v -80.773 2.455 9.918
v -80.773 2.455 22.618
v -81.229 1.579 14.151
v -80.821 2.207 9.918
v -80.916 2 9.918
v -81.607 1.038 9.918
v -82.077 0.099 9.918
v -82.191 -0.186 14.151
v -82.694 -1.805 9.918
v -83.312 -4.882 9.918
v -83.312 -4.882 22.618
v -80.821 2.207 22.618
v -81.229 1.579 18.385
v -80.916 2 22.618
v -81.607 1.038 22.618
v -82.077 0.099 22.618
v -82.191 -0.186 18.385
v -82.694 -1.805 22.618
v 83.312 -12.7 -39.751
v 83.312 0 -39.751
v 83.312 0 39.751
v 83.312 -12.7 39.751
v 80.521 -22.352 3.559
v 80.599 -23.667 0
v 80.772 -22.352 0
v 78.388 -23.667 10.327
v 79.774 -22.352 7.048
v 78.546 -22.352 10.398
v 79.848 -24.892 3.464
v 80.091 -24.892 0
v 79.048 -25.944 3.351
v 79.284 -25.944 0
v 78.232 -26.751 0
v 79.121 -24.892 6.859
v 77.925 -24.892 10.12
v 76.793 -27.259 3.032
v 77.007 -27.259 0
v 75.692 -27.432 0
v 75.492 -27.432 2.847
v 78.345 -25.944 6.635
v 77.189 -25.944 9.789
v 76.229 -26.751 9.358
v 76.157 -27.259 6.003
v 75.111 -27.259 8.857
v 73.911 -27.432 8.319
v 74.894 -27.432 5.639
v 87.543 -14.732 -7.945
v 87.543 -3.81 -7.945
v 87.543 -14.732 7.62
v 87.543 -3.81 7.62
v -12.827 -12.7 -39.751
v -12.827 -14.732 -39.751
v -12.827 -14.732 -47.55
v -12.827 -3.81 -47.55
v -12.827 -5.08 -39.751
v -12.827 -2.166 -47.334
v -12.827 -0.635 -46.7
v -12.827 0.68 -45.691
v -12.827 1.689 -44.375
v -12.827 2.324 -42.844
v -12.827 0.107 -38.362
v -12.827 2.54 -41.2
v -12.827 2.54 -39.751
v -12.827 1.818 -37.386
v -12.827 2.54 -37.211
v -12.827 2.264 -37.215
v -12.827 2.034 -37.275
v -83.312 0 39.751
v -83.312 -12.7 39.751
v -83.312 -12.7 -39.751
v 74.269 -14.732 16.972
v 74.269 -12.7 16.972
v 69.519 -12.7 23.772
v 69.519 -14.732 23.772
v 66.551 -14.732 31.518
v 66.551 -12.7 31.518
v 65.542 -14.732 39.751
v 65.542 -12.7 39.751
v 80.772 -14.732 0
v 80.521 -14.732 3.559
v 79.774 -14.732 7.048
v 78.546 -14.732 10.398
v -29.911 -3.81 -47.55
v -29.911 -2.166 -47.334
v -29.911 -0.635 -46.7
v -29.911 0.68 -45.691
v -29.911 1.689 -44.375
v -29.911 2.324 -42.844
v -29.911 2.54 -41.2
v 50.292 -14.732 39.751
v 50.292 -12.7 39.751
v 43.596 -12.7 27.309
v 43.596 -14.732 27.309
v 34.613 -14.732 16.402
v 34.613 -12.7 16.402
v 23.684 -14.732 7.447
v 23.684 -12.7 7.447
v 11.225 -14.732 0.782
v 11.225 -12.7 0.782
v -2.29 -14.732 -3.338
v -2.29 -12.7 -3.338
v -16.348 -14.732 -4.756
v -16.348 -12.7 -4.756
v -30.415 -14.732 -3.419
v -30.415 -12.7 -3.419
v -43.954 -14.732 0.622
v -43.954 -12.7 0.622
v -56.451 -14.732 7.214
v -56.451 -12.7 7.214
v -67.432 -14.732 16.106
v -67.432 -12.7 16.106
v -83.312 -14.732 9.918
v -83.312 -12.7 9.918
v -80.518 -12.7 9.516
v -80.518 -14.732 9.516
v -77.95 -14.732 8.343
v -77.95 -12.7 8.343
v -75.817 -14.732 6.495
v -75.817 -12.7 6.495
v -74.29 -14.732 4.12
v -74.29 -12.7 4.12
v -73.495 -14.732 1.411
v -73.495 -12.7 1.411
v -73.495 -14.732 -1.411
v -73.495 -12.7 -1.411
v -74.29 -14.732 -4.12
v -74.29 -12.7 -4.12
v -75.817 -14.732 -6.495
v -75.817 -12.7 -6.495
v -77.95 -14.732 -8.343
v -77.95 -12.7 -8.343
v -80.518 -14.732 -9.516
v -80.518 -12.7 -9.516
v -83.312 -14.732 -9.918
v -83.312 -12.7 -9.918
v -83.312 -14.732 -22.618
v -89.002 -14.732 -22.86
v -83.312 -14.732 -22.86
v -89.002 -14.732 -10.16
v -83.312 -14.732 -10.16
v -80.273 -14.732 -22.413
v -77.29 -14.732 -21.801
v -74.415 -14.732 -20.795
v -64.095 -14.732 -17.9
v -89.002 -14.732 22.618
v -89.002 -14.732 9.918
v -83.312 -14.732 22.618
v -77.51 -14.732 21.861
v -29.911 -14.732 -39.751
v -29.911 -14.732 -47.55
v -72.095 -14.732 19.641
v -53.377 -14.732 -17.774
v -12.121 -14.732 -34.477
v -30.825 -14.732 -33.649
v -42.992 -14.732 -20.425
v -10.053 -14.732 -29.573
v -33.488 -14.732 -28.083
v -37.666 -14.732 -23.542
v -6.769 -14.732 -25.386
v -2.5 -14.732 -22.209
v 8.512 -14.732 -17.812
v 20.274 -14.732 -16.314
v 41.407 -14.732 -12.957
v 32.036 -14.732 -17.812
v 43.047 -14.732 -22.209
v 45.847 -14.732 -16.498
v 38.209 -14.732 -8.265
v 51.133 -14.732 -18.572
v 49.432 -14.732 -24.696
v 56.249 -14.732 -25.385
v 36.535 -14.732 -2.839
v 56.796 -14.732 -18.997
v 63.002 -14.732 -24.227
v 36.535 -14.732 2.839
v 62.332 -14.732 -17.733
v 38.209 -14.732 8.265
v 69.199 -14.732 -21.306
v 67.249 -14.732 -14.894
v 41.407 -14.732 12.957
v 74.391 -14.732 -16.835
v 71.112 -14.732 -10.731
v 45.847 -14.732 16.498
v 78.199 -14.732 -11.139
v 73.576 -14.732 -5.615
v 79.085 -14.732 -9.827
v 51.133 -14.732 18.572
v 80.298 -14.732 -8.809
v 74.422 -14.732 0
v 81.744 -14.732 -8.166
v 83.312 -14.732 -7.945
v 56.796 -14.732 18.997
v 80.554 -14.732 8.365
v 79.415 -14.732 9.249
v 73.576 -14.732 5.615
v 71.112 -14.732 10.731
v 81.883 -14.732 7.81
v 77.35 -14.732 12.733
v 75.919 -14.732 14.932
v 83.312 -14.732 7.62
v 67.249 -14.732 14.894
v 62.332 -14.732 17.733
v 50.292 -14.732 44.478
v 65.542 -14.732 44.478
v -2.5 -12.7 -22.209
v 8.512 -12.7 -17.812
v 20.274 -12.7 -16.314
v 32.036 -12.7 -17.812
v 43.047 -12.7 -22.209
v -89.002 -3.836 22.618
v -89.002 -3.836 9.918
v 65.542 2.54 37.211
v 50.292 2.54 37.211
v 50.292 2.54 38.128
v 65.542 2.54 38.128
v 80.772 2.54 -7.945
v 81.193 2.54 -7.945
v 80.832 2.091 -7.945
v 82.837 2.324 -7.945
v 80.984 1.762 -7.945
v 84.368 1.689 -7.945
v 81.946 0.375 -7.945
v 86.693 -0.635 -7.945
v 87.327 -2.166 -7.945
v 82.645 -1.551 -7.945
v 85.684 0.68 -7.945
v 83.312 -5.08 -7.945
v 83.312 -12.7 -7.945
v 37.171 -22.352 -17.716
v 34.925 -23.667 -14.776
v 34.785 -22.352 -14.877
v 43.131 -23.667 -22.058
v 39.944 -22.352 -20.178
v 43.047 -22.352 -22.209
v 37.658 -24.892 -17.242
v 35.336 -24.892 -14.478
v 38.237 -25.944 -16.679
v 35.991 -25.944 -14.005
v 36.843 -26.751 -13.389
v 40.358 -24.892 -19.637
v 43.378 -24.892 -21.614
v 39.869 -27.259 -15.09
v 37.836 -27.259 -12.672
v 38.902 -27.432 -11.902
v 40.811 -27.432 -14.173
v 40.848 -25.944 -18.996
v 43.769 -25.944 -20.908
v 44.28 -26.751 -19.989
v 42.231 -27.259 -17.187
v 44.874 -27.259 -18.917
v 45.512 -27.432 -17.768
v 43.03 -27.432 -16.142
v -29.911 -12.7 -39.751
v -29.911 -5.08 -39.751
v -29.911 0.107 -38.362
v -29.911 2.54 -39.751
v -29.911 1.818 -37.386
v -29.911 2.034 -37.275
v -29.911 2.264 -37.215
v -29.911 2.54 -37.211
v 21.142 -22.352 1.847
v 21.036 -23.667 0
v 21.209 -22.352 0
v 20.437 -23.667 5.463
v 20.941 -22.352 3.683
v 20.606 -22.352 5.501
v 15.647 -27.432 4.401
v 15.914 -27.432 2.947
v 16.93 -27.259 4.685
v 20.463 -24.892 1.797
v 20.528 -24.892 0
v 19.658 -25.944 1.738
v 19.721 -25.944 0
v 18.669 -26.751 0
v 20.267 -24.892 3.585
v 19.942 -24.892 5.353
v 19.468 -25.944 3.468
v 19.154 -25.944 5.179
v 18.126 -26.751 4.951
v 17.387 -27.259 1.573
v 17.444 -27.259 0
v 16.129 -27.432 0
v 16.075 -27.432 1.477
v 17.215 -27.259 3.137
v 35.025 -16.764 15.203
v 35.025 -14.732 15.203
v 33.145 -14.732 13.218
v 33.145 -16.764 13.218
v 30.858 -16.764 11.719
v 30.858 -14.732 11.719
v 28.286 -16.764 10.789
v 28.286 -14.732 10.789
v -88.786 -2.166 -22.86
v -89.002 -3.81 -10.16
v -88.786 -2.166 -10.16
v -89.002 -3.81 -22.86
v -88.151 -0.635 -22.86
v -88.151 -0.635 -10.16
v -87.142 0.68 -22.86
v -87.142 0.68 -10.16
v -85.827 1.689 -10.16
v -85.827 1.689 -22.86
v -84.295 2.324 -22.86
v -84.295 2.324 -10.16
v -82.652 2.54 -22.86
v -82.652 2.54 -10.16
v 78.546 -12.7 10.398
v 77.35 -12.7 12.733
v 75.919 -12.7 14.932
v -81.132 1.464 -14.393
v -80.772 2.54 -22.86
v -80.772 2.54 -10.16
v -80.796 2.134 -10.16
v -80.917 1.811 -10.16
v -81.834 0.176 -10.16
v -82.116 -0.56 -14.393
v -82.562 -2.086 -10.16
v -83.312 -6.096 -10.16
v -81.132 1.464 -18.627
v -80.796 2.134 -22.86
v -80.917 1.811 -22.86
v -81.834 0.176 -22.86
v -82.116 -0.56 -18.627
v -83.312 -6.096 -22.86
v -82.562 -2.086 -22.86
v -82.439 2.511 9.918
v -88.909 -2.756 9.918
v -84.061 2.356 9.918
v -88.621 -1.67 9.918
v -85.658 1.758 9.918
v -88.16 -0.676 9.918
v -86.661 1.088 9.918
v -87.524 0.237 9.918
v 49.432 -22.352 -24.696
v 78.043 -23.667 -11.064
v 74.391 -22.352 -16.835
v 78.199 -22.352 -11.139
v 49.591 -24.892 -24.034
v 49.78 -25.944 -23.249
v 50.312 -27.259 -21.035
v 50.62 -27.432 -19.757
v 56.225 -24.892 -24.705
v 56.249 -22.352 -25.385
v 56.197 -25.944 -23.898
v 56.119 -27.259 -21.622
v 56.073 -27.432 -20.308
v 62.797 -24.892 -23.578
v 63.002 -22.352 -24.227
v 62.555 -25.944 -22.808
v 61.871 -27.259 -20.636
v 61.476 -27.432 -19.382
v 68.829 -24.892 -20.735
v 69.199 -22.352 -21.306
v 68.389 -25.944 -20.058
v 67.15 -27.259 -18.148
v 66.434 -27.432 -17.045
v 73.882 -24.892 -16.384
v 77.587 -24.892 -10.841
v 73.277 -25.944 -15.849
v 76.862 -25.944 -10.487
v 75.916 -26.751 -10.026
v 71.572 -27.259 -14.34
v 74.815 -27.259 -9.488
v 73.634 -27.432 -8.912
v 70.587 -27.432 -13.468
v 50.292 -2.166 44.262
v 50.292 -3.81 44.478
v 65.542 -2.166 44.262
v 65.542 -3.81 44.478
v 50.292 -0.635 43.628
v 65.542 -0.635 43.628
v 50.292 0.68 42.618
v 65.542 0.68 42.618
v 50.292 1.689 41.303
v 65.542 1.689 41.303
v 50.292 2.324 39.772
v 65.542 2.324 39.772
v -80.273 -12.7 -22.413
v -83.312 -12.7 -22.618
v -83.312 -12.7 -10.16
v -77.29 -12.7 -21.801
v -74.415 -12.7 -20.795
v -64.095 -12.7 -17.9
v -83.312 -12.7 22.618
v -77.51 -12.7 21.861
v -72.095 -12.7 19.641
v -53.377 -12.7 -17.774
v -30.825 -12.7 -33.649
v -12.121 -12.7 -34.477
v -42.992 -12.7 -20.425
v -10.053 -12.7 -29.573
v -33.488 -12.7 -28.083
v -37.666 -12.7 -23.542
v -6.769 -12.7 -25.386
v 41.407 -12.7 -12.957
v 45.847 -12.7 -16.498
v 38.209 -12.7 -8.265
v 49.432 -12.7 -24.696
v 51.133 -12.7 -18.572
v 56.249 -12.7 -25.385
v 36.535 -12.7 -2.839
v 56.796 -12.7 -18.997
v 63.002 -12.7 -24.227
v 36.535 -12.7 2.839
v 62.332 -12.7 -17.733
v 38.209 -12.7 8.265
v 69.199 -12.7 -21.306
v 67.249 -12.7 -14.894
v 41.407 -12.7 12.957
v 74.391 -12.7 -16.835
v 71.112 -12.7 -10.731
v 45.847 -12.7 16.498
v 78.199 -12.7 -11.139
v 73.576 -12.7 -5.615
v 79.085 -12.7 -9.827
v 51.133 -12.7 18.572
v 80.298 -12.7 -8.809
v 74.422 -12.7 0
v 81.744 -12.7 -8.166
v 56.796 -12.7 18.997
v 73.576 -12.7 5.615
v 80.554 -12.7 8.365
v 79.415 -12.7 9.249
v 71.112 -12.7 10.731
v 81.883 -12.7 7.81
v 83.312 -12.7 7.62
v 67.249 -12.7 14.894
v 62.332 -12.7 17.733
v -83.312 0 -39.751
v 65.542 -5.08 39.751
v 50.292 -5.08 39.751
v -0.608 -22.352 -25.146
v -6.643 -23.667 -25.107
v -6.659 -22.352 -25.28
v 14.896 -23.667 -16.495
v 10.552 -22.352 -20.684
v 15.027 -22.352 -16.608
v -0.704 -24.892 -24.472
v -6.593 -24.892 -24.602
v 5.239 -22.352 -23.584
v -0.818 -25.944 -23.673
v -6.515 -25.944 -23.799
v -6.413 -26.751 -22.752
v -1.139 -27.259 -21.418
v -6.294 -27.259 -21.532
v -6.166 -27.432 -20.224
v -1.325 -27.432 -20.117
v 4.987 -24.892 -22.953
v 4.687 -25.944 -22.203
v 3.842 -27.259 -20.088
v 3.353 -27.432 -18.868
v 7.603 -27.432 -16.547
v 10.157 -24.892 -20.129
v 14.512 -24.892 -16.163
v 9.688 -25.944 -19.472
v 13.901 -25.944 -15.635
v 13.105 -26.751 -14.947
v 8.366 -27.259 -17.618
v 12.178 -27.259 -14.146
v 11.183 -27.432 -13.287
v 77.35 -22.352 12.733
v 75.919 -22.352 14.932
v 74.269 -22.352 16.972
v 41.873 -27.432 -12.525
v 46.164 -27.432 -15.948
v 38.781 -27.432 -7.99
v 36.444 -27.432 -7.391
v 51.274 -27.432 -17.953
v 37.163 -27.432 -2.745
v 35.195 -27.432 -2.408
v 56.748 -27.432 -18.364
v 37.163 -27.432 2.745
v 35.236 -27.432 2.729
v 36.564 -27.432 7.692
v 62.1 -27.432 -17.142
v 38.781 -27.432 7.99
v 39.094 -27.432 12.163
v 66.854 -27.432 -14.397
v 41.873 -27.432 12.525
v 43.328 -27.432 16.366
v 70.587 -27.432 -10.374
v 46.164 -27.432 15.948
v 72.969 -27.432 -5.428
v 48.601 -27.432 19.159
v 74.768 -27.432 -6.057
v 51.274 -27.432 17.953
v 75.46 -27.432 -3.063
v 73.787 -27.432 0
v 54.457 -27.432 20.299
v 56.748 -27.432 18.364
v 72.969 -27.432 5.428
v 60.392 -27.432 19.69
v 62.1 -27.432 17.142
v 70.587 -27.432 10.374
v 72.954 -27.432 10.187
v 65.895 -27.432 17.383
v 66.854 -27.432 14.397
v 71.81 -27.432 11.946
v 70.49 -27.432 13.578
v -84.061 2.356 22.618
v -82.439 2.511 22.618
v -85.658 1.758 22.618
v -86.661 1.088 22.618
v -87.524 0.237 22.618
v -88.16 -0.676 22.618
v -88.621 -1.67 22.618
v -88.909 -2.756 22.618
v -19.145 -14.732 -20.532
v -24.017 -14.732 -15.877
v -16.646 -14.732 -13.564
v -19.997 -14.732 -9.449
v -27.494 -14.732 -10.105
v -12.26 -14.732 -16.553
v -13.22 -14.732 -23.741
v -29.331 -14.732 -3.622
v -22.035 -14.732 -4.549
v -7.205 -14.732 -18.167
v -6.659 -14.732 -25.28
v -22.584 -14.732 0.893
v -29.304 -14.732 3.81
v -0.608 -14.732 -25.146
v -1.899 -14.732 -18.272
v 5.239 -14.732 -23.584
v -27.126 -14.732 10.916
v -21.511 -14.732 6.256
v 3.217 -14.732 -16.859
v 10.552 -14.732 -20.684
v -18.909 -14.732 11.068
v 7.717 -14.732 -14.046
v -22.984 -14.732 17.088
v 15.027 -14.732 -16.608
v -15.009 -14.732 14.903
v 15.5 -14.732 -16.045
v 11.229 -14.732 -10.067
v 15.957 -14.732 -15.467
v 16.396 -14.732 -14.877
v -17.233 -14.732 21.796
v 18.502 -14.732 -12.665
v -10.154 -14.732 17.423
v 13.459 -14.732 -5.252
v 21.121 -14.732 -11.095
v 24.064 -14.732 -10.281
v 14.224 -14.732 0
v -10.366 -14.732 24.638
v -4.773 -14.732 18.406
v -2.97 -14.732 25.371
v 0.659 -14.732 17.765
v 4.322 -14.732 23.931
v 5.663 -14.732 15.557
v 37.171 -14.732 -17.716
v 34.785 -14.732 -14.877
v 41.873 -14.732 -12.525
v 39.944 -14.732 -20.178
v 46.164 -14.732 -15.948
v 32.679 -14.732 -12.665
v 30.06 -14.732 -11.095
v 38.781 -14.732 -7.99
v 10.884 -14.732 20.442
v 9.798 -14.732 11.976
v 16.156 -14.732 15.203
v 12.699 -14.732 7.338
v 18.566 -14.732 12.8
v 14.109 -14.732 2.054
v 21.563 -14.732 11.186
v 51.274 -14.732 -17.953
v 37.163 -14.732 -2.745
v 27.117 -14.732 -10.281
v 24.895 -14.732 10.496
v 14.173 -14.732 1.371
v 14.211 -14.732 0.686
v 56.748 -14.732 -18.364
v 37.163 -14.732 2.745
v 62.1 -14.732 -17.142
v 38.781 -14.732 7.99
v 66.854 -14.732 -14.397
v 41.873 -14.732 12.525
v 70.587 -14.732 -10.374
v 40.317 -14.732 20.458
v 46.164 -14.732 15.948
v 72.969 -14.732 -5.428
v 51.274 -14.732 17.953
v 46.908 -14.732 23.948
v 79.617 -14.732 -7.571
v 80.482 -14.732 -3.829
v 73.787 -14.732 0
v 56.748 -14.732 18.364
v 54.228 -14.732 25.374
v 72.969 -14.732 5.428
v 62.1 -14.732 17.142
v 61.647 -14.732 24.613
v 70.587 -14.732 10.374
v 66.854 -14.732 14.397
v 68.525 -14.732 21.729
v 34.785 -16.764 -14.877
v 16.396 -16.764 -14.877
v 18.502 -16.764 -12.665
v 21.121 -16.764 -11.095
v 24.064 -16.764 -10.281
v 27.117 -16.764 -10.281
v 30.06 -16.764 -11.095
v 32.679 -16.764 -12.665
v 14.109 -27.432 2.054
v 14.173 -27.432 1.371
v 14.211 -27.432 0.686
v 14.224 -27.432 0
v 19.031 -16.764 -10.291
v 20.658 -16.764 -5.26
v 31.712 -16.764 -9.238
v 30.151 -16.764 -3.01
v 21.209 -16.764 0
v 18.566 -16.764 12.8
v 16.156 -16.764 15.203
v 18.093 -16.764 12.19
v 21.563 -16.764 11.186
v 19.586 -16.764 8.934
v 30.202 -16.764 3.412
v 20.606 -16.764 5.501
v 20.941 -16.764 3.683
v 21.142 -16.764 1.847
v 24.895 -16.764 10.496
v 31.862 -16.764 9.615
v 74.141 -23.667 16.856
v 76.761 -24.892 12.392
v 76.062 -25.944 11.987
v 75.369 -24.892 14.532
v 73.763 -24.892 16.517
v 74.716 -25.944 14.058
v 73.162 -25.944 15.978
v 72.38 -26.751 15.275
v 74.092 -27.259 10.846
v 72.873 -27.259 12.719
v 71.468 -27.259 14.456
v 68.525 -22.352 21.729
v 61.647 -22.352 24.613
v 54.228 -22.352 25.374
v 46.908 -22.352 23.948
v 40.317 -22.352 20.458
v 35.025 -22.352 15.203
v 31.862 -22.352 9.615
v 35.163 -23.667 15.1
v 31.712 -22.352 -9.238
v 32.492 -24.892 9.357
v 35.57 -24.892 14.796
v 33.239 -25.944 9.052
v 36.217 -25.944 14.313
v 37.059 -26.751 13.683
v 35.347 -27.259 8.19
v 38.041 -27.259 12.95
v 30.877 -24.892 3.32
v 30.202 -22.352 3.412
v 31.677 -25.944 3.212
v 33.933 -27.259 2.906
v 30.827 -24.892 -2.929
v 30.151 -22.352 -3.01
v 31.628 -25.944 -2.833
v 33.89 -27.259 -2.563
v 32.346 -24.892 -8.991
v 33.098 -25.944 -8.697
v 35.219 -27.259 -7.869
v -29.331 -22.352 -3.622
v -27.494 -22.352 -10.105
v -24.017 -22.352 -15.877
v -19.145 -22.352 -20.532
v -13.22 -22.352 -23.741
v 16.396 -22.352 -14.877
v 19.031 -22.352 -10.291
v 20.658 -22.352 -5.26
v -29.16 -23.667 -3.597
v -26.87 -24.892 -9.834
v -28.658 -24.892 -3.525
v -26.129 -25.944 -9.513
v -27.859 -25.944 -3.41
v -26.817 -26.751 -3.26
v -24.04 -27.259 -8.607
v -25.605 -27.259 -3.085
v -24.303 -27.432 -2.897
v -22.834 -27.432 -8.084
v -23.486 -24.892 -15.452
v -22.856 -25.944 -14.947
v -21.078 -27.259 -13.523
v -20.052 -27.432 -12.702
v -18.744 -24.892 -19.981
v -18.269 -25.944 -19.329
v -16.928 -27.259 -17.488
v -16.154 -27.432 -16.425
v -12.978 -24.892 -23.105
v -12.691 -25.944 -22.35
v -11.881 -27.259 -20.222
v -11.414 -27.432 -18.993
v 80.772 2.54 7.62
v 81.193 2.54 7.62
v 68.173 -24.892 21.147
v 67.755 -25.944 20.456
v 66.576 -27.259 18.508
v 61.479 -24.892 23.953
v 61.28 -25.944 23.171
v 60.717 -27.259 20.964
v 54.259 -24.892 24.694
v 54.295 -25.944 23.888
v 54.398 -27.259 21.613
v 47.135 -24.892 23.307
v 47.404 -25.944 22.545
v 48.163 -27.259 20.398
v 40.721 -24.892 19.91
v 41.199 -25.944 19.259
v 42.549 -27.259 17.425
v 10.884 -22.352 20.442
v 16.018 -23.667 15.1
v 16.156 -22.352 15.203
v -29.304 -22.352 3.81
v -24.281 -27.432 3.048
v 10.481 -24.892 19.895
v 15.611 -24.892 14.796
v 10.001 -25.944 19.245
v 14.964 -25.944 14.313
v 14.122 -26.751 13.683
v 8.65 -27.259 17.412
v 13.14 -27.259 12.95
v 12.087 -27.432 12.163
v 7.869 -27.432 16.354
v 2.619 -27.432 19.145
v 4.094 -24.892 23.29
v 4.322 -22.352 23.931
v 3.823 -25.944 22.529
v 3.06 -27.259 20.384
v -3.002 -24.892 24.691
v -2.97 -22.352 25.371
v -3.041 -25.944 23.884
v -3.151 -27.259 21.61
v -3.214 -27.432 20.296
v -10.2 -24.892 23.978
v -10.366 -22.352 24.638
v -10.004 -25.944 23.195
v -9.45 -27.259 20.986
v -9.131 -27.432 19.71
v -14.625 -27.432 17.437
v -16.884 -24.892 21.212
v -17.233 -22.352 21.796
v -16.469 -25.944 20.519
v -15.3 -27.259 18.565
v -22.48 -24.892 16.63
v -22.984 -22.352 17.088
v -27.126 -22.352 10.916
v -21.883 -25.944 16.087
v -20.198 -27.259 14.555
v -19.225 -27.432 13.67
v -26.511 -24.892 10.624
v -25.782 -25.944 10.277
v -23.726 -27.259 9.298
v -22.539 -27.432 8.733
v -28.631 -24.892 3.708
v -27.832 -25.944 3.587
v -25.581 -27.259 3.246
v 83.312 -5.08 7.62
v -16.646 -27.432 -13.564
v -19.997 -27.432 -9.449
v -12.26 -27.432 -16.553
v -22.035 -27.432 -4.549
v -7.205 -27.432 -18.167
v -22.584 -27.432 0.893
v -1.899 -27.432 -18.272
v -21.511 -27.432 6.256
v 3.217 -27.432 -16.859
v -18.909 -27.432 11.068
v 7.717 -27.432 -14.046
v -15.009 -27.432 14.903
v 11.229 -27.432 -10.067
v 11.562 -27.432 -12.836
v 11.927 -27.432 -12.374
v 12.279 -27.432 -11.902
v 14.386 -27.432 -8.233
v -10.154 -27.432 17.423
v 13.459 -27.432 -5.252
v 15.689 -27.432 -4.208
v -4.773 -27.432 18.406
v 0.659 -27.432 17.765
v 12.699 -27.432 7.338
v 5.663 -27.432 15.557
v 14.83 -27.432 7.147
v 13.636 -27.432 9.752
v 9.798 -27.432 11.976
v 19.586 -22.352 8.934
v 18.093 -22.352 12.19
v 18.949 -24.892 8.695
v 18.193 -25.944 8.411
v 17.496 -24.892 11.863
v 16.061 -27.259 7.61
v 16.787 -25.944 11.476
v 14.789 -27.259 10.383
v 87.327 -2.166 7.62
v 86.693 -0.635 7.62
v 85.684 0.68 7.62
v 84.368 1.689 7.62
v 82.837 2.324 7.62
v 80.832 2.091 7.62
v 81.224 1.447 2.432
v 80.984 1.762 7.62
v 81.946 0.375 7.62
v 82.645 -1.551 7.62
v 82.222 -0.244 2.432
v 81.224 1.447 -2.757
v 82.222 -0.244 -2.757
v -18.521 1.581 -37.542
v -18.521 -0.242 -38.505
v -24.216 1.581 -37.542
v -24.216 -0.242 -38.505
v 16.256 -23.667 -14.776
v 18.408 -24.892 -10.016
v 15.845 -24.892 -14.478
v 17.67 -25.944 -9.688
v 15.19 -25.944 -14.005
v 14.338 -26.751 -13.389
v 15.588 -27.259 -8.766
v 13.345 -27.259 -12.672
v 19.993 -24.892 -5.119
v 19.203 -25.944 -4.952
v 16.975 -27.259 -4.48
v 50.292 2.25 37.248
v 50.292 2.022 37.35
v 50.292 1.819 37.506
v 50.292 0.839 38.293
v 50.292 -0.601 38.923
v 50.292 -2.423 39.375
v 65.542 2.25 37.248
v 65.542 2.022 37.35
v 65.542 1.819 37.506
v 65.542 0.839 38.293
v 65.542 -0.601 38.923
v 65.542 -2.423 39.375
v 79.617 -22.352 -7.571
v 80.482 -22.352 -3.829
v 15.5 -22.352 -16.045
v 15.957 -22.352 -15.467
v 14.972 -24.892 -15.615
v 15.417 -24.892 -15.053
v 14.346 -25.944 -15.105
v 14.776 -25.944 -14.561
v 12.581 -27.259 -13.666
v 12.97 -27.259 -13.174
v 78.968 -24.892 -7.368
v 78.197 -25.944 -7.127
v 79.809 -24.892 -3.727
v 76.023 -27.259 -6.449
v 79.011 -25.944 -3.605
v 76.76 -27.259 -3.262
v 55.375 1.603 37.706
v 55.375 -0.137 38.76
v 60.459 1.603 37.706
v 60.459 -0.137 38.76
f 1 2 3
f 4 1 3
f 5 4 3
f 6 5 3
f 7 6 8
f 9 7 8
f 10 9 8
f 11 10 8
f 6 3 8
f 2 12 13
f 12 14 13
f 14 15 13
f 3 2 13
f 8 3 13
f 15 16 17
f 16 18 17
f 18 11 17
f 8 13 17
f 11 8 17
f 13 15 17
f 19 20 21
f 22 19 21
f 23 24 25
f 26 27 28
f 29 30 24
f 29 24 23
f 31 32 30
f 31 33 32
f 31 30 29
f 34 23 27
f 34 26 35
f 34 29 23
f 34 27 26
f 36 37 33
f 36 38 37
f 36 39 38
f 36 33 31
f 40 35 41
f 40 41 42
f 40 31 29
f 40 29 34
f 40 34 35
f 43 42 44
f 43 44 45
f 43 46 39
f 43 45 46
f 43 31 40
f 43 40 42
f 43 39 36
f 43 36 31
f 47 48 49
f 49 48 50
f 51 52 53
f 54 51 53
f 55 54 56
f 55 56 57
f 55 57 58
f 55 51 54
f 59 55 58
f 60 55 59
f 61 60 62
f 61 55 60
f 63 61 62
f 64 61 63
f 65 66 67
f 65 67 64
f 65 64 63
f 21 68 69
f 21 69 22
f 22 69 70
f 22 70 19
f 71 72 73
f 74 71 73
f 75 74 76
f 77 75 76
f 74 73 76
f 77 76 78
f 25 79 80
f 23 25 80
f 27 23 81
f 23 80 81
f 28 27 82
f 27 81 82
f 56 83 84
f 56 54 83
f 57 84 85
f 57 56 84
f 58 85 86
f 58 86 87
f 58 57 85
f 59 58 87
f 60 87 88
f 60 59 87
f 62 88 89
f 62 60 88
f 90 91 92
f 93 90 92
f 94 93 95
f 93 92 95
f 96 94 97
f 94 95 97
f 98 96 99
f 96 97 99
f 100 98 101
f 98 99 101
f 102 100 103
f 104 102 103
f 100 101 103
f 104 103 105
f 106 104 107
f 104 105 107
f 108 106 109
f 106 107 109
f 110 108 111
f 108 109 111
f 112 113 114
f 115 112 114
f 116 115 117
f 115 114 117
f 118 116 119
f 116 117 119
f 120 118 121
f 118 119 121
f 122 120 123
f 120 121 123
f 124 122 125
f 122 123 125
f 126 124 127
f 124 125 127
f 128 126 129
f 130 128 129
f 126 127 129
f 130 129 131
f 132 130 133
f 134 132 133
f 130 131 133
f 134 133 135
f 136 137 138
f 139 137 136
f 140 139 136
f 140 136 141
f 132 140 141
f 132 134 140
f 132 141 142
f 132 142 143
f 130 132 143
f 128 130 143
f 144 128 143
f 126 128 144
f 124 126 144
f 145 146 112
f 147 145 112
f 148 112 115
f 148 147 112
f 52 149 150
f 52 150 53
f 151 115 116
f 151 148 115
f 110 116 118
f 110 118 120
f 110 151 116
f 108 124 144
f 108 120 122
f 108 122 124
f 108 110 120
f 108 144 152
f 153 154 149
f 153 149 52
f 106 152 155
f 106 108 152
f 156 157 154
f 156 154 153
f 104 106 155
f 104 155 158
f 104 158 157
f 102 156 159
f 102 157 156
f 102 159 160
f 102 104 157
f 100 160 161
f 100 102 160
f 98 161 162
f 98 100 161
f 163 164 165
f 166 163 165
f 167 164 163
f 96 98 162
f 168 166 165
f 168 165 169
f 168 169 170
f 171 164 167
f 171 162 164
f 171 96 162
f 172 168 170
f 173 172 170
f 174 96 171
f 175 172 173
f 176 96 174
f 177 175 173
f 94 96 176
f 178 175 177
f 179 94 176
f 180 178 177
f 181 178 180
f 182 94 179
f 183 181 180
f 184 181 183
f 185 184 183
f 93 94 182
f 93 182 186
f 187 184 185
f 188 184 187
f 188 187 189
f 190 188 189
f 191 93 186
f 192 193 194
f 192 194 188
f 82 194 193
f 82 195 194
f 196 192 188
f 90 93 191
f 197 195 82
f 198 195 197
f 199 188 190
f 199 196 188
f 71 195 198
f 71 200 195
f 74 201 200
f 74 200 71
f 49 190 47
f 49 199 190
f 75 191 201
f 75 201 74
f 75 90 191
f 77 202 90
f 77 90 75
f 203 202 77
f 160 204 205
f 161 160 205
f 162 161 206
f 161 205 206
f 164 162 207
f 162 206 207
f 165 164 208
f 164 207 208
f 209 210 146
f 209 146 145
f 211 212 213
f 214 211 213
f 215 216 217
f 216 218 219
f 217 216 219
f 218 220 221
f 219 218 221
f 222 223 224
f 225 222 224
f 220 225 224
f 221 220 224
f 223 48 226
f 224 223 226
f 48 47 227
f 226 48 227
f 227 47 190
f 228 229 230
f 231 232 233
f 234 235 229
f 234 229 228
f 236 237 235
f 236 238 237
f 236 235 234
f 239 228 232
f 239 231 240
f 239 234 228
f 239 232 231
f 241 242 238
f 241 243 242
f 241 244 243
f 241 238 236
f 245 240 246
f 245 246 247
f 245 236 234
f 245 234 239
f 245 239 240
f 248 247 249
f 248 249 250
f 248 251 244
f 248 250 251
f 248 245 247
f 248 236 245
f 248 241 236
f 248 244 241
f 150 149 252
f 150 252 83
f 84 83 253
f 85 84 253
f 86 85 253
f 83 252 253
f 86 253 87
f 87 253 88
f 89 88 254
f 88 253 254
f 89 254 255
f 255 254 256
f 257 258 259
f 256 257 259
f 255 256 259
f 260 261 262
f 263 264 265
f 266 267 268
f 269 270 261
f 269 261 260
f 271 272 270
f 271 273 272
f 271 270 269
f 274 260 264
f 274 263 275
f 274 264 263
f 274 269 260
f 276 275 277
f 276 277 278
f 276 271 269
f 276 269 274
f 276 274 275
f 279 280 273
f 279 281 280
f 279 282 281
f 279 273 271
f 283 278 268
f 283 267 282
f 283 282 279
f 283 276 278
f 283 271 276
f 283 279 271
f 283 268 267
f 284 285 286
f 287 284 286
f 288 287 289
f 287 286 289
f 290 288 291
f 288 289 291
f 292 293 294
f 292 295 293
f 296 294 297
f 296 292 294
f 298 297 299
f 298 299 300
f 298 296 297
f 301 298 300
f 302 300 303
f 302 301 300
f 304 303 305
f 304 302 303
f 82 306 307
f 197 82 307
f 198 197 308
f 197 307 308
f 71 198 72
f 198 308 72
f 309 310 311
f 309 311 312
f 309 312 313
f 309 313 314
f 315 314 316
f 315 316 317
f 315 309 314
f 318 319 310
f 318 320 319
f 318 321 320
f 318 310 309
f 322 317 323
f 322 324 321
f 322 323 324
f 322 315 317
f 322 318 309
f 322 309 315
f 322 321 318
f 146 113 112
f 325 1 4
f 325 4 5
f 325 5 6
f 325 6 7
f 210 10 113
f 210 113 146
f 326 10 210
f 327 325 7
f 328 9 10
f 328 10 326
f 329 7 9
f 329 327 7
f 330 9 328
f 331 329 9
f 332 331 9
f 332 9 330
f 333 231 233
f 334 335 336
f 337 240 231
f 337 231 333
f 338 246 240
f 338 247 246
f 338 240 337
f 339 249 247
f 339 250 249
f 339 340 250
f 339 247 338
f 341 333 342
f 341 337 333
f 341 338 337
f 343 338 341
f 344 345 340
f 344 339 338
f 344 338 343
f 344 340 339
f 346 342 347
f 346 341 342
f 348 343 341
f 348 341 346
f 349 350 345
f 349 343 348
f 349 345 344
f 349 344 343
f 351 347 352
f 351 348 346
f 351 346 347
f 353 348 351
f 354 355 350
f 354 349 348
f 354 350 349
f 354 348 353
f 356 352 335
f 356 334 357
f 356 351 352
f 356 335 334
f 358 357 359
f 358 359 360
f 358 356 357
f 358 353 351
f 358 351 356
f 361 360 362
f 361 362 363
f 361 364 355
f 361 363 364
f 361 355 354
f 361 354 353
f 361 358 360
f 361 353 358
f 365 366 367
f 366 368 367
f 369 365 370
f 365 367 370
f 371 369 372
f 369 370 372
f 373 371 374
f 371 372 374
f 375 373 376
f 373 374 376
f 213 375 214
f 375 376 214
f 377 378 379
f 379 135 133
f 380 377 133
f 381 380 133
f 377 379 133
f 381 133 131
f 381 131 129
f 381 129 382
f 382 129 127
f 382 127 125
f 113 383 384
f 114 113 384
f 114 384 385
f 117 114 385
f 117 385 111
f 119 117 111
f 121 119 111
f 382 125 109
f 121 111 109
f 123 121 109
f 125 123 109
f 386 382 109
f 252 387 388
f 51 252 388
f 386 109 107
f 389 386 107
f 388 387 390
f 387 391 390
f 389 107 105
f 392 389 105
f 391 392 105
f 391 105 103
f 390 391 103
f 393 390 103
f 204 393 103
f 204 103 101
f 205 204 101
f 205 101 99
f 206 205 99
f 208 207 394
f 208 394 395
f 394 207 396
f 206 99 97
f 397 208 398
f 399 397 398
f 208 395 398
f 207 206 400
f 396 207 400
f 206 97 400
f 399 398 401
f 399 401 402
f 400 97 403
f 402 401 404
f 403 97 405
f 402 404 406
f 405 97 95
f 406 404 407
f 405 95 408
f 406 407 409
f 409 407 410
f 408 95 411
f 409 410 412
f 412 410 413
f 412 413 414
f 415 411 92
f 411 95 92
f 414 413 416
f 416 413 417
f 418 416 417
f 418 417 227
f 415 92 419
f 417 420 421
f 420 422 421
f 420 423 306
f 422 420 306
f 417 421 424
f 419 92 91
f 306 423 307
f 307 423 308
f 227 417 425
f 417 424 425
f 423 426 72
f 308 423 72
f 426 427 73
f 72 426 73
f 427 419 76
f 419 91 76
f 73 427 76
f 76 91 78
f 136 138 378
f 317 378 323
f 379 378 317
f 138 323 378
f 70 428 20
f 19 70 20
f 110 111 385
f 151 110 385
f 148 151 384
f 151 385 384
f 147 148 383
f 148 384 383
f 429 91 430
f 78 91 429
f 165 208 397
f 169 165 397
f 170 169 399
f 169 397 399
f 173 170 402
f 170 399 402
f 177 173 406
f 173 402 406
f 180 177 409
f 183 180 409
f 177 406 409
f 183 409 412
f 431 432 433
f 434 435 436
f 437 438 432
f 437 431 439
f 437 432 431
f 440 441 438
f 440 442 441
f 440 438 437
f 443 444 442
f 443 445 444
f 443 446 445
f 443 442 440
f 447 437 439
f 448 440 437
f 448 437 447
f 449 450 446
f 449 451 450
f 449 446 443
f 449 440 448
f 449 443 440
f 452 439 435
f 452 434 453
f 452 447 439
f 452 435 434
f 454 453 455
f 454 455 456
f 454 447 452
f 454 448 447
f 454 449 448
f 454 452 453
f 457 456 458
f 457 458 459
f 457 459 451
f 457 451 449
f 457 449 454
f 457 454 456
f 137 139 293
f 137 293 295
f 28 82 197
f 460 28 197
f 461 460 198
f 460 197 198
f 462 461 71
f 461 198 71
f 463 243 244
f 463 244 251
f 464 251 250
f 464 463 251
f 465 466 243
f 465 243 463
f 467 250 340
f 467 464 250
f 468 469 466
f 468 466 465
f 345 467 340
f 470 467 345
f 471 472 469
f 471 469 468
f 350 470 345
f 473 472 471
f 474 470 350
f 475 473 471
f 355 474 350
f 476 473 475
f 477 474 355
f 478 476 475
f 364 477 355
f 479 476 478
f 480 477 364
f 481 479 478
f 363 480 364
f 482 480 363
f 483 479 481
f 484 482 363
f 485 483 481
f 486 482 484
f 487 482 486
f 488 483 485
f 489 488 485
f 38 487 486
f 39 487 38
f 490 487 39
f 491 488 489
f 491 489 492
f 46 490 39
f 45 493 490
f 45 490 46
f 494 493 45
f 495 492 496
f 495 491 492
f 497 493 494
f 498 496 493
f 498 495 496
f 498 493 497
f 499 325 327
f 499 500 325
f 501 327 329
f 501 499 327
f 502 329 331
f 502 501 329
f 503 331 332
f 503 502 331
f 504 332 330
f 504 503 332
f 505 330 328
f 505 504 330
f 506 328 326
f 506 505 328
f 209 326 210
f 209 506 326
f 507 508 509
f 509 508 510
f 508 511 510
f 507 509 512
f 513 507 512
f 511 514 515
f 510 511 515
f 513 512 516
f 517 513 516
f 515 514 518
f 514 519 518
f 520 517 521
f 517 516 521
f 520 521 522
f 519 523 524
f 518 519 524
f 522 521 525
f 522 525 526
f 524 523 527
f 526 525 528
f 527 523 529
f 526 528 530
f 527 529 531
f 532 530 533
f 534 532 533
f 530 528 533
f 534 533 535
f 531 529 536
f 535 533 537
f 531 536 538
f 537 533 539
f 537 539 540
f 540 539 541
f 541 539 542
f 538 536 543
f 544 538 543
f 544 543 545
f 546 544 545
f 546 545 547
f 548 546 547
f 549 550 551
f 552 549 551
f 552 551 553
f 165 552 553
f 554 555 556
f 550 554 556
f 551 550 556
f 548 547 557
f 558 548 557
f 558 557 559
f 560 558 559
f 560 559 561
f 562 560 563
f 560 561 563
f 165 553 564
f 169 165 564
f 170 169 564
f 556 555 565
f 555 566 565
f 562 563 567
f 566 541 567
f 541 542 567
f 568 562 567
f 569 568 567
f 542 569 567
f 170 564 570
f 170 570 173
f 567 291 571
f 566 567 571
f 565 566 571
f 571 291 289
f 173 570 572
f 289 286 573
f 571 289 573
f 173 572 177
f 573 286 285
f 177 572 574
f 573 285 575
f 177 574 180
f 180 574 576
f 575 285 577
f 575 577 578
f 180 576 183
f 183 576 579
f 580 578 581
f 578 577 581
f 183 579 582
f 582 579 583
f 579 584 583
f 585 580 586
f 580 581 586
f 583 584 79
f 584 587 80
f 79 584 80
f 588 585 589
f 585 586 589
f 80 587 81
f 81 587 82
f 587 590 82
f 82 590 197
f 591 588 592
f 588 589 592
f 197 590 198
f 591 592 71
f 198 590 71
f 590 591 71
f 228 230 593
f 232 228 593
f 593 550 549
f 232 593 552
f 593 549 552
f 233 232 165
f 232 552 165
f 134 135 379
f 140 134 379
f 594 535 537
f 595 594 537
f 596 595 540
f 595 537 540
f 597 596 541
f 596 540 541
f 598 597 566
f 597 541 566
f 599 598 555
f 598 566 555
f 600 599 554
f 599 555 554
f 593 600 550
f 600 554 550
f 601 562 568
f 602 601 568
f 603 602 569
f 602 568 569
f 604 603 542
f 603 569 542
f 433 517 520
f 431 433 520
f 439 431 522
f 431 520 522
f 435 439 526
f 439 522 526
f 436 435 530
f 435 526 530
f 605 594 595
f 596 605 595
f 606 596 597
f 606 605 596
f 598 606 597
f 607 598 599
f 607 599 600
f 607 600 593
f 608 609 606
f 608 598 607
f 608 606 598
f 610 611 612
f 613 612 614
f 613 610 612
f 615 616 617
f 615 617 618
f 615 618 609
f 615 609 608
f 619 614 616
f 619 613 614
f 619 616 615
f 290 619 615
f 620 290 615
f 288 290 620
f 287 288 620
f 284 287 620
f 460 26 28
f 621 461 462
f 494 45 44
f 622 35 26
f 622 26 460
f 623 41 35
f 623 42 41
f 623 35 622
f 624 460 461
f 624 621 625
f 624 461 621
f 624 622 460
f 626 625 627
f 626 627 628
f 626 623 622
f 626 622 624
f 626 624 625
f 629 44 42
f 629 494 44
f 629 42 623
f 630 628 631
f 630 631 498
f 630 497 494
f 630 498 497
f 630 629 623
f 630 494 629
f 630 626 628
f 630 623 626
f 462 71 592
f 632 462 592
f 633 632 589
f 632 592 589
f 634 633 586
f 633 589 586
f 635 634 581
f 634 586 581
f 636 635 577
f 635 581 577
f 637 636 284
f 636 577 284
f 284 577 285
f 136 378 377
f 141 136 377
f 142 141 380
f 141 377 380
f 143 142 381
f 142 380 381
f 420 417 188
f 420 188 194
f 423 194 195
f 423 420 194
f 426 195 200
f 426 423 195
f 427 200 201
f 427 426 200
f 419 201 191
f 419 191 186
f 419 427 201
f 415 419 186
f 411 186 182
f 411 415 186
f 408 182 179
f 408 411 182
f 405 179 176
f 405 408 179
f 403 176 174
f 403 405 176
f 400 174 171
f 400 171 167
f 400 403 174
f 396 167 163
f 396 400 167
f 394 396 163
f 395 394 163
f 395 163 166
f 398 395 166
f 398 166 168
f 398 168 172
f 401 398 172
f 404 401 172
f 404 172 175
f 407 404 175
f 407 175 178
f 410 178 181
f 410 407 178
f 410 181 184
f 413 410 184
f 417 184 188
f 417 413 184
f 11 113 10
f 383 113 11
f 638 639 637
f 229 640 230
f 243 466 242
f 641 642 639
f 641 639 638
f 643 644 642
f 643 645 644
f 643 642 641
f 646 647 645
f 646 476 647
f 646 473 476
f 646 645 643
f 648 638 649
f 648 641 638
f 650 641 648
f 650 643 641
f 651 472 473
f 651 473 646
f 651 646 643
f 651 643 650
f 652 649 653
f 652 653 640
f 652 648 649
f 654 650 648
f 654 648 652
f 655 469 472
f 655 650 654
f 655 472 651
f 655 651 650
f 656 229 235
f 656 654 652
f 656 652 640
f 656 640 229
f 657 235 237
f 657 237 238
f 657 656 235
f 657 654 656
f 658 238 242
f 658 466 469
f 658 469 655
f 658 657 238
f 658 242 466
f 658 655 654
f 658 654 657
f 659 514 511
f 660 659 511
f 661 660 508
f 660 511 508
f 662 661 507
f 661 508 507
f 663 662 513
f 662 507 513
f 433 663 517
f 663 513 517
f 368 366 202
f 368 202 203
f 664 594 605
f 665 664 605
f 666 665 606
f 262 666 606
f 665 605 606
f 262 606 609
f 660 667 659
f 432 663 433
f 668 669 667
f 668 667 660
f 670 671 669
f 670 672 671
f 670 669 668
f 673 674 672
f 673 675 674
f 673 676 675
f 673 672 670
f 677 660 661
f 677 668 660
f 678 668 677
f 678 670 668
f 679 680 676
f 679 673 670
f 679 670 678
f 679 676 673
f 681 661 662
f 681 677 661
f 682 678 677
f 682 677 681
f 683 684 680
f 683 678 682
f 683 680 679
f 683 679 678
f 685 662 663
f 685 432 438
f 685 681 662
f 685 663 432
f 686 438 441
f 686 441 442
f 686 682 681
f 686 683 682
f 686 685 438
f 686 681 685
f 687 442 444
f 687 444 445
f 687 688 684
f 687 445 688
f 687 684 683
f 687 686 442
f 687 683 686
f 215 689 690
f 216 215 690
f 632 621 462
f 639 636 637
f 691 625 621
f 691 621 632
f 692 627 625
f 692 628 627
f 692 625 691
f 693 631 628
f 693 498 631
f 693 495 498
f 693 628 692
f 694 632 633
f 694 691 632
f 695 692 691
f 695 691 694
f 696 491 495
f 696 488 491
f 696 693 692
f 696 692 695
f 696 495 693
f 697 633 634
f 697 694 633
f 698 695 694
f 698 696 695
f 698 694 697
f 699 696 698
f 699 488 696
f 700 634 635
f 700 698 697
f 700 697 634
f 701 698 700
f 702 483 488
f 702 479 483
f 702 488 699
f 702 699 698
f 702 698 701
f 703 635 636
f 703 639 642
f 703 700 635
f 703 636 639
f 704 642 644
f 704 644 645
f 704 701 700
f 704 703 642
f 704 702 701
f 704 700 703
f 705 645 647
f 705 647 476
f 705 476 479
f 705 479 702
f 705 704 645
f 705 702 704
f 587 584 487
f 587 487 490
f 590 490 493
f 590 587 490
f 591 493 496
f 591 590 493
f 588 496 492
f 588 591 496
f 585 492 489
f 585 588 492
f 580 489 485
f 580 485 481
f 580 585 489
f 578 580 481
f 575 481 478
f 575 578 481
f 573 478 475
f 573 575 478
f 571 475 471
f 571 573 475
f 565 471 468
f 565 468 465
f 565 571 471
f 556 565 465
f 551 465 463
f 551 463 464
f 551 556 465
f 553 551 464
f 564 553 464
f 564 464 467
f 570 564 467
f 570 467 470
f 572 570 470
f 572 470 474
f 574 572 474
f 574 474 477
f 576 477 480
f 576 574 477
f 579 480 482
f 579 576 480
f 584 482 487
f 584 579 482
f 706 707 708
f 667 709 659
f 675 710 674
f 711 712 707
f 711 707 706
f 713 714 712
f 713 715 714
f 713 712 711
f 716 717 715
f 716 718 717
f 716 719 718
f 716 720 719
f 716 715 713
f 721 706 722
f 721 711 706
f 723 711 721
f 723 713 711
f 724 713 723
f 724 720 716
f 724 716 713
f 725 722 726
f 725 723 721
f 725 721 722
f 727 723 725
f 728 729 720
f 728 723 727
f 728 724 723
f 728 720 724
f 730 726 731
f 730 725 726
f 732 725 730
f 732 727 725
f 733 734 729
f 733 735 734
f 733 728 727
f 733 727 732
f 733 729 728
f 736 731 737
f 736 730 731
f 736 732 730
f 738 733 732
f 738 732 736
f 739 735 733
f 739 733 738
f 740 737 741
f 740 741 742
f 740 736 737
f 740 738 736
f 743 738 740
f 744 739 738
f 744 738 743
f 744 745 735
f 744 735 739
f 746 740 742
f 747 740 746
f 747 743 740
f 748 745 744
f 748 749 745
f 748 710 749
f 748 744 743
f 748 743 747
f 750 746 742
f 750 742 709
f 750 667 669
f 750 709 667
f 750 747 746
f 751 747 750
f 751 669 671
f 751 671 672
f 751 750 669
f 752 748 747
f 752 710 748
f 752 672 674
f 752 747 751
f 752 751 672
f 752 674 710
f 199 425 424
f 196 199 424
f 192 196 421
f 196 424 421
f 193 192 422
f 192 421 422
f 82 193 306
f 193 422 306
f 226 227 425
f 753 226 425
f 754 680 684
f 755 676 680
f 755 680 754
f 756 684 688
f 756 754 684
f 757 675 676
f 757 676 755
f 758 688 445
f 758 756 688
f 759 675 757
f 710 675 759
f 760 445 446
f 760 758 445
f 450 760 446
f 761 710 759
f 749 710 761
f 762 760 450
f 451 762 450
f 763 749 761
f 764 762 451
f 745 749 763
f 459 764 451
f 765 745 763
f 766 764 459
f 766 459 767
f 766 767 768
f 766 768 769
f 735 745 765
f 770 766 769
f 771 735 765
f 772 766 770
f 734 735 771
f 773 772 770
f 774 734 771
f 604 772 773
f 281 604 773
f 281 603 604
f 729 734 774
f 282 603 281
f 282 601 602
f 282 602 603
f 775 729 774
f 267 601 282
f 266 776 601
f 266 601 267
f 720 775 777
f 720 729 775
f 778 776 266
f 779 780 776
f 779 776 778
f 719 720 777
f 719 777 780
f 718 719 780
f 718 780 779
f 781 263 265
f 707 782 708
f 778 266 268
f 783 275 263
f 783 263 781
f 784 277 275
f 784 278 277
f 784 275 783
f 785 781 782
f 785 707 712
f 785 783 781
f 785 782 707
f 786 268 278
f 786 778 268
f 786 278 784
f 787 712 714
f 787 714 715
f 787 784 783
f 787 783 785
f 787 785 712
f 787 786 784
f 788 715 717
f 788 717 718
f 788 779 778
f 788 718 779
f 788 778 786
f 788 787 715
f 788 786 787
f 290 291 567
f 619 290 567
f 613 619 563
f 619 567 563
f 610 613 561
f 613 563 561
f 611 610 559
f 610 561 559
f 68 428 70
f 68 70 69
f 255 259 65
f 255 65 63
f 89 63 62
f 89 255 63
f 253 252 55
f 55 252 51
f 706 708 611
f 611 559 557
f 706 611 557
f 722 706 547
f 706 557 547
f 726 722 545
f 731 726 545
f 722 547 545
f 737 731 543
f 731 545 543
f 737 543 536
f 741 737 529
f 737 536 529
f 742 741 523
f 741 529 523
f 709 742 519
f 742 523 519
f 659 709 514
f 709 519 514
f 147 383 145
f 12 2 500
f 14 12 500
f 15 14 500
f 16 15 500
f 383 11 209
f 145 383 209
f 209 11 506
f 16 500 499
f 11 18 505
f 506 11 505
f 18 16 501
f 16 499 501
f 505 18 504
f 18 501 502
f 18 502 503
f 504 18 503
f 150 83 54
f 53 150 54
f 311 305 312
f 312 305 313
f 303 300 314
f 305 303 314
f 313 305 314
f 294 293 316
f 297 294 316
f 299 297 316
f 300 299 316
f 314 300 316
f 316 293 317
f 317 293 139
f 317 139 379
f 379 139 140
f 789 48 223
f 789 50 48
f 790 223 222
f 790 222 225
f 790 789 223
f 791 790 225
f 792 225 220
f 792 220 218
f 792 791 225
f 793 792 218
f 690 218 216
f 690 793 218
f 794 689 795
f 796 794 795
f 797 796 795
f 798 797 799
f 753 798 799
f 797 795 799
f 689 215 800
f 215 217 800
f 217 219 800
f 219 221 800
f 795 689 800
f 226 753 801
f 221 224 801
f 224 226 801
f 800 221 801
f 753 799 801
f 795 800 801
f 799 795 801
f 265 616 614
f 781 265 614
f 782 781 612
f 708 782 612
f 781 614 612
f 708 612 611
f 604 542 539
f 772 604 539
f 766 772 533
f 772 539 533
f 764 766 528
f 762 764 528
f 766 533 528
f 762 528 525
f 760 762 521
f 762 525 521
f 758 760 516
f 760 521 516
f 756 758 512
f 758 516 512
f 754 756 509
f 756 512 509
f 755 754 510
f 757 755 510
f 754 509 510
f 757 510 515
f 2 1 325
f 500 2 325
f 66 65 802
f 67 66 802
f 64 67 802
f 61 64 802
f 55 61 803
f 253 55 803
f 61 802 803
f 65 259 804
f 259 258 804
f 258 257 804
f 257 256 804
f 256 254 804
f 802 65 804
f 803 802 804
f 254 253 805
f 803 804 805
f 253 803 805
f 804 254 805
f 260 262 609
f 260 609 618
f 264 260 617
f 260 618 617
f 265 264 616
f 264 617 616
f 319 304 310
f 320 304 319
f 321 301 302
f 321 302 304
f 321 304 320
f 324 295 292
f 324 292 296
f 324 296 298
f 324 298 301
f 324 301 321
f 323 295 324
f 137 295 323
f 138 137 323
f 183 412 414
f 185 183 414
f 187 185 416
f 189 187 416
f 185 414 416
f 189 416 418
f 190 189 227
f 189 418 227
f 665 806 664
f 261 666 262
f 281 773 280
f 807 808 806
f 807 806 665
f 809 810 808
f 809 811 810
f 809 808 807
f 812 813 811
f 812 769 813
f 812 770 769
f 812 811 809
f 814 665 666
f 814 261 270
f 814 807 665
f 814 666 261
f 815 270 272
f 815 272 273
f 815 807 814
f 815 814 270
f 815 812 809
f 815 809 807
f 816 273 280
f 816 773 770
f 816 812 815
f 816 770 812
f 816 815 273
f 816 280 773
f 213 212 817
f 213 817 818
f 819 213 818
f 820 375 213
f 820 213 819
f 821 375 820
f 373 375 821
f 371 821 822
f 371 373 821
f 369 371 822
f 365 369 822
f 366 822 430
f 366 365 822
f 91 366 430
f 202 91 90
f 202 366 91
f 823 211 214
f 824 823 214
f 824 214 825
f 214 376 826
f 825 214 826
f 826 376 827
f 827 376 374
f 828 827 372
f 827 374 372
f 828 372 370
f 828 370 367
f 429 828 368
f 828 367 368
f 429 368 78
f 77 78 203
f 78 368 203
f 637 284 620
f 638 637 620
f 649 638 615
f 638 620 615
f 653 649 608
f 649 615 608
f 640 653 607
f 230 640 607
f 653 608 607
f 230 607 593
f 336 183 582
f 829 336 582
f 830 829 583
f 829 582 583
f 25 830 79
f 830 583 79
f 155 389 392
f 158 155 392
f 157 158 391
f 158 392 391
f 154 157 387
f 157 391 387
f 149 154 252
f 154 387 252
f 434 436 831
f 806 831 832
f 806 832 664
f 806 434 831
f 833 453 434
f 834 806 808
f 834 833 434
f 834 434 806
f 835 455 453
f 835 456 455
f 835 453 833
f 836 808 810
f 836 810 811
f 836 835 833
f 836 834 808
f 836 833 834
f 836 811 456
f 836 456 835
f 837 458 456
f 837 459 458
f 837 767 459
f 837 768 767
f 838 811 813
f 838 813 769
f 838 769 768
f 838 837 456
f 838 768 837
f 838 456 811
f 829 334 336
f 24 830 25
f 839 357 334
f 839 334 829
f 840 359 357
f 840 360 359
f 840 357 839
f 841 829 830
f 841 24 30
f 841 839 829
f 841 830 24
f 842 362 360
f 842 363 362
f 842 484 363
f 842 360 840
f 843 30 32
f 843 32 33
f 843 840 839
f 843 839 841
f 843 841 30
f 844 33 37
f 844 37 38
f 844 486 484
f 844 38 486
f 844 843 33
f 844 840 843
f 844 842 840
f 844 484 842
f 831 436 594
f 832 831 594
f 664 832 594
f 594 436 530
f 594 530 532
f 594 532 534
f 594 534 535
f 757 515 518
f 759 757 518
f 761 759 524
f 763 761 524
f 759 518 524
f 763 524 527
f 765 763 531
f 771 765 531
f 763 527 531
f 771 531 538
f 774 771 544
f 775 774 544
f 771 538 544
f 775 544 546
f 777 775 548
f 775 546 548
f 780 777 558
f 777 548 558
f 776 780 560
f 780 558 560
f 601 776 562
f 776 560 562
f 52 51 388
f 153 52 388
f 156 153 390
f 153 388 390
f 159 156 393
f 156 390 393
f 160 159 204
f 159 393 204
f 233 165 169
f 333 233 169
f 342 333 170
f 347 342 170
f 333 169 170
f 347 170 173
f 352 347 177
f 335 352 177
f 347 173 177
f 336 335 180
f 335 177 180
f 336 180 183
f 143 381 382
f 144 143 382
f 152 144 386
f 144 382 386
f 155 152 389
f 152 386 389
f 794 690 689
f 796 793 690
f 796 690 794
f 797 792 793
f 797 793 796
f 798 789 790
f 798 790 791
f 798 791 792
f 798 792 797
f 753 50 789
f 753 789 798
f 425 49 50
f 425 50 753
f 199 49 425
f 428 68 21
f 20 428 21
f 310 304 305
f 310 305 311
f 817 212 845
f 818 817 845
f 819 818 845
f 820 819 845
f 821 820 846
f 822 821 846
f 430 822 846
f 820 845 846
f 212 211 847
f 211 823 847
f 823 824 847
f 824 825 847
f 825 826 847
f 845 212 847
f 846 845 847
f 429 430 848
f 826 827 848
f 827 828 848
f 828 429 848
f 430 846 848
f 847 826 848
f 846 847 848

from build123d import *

# Parameters (mm, degrees)
F0_W      = 166.624
F0_H      = 79.502
F1_DEPTH  = 12.7
F3_R      = 19.05
F3_W      = 15.2498179367
F3_H      = 4.727289783
F3_W_2    = 4.2314800982
F3_H_2    = 15.5652722449
F3_W_3    = 17.0839390975
F3_H_3    = 7.7993963947
F3_W_4    = 5.6899759536
F3_H_4    = 12.7
F4_DEPTH  = 2.032
F5_DEPTH  = 15.24
F7_DEPTH  = 15.2498179367
F9_DEPTH  = 15.5652722449
F11_DEPTH = 17.0839390975
F13_DEPTH = 12.7
F15_DEPTH = 12.7
F16_R     = 6.35
F18_DEPTH = 2.032
F17_R     = 19.05
F17_R_2   = 18.415
F19_DEPTH = 12.7
F20_R     = 5.08


# Not quite as in the source:
# - a feature of the source that left no trace in its solid (it failed there, or was rolled back) is left out


with BuildPart() as f1:
    # F0 (on Front) → F1 (new body)
    with BuildSketch(Plane.XZ):
        Rectangle(F0_W, F0_H)
    extrude(amount=F1_DEPTH)


with BuildPart() as f4:
    # F3 (on face) → F4 (new body)
    with BuildSketch(Plane.XZ.offset(12.7)):
        with BuildLine():
            Line((83.312, -7.9452722449), (83.312, 7.62))
            ThreePointArc((83.312, 7.62), (80.5537024075, 8.3652624791), (78.5460535381, 10.3982326679))
            ThreePointArc((78.5460535381, 10.3982326679), (76.662940796, 13.8512035585), (74.2693311981, 16.9720615598))
            ThreePointArc((74.2693311981, 16.9720615598), (67.7983810803, 27.5541815195), (65.5418179367, 39.751))
            Line((65.5418179367, 39.751), (50.292, 39.751))
            ThreePointArc((50.292, 39.751), (-2.2901946449, -3.3376030905), (-67.4321012743, 16.1058253792))
            ThreePointArc((-67.4321012743, 16.1058253792), (-74.7303608062, 20.9266400417), (-83.312, 22.6178866096))
            Line((-83.312, 22.6178866096), (-83.312, 9.9178866096))
            ThreePointArc((-83.312, 9.9178866096), (-73.3941133904, 0), (-83.312, -9.9178866096))
            Line((-83.312, -9.9178866096), (-83.312, -10.16))
            Line((-83.312, -10.16), (-83.312, -22.6178866096))
            ThreePointArc((-83.312, -22.6178866096), (-78.7711442585, -22.1573785413), (-74.4151953336, -20.7946065463))
            ThreePointArc((-74.4151953336, -20.7946065463), (-58.7402465196, -17.4860386913), (-42.9917926654, -20.424889278))
            ThreePointArc((-42.9917926654, -20.424889278), (-33.4884475886, -28.0825335776), (-29.9107422883, -39.751))
            Line((-29.9107422883, -39.751), (-12.8268031908, -39.751))
            ThreePointArc((-12.8268031908, -39.751), (-10.0533012351, -29.573156585), (-2.4996713636, -22.2094967991))
            ThreePointArc((-2.4996713636, -22.2094967991), (20.2738138752, -16.3141101101), (43.0472991139, -22.2094967991))
            ThreePointArc((43.0472991139, -22.2094967991), (63.0016110107, -24.2270310981), (78.1990053344, -11.1394715972))
            ThreePointArc((78.1990053344, -11.1394715972), (80.2976334018, -8.8094548883), (83.312, -7.9452722449))
        make_face()
        with Locations((55.372, 0)):
            Circle(F3_R, mode=Mode.SUBTRACT)
        with Locations((57.9169089684, 42.1146448915)):
            Rectangle(F3_W, F3_H)
        with Locations((85.4277400491, -0.1626361225)):
            Rectangle(F3_W_2, F3_H_2)
        with Locations((-21.3687727395, -43.6506981973)):
            Rectangle(F3_W_3, F3_H_3)
        Polygon((-89.0019759536, -22.86), (-83.312, -22.86), (-83.312, -22.6178866096), (-83.312, -10.16), (-89.0019759536, -10.16), align=None)
        with Locations((-86.1569879768, 16.2678866096)):
            Rectangle(F3_W_4, F3_H_4)
    extrude(amount=F4_DEPTH)

    # F3 (on face) → F5 (join)
    with BuildSketch(Plane.XZ.offset(12.7)):
        Polygon((-89.0019759536, -22.86), (-83.312, -22.86), (-83.312, -22.6178866096), (-83.312, -10.16), (-89.0019759536, -10.16), align=None)
        with Locations((-86.1569879768, 16.2678866096)):
            Rectangle(F3_W_4, F3_H_4)
        with Locations((-21.3687727395, -43.6506981973)):
            Rectangle(F3_W_3, F3_H_3)
        with Locations((57.9169089684, 42.1146448915)):
            Rectangle(F3_W, F3_H)
        with Locations((85.4277400491, -0.1626361225)):
            Rectangle(F3_W_2, F3_H_2)
    extrude(amount=-F5_DEPTH)

    # F6 (on face) → F7 (join, through all)
    with BuildSketch(Plane.YZ.offset(65.5418179367)):
        with BuildLine():
            add(Edge.make_bspline(
                [(2.54, 37.211), (1.2037418783, 37.2195914388), (2.2650531027, 38.99884969), (-5.08, 39.751)],
                knots=[0, 0, 0, 0, 8.0321852568, 8.0321852568, 8.0321852568, 8.0321852568], degree=3))
            Line((2.54, 37.211), (2.54, 39.751))
            Line((2.54, 39.751), (-5.08, 39.751))
        make_face()
    extrude(amount=-F7_DEPTH)

    # F8 (on face) → F9 (join, through all)
    with BuildSketch(Plane(origin=(0, 0, -7.9452722449), x_dir=(1, 0, 0), z_dir=(0, 0, -1))):
        with BuildLine():
            add(Edge.make_bspline(
                [(80.772, -2.54), (80.7990506291, -0.8979742997), (82.3285877705, -2.1777907386), (83.312, 5.08)],
                knots=[0, 0, 0, 0, 8.0321852568, 8.0321852568, 8.0321852568, 8.0321852568], degree=3))
            Line((80.772, -2.54), (83.312, -2.54))
            Line((83.312, -2.54), (83.312, 5.08))
        make_face()
    extrude(amount=-F9_DEPTH)

    # F10 (on face) → F11 (join, through all)
    with BuildSketch(Plane(origin=(-29.9107422883, 0, 0), x_dir=(0, -1, 0), z_dir=(-1, 0, 0))):
        with BuildLine():
            add(Edge.make_bspline(
                [(-2.54, -37.211), (-1.2959121959, -37.1081680059), (-1.9826430362, -38.481), (5.08, -39.751)],
                knots=[0, 0, 0, 0, 8.0321852568, 8.0321852568, 8.0321852568, 8.0321852568], degree=3))
            Line((-2.54, -37.211), (-2.54, -39.751))
            Line((-2.54, -39.751), (5.08, -39.751))
        make_face()
    extrude(amount=-F11_DEPTH)

    # F12 (on face) → F13 (join, through all)
    with BuildSketch(Plane(origin=(0, 0, -22.86), x_dir=(1, 0, 0), z_dir=(0, 0, -1))):
        with BuildLine():
            Line((-83.312, -2.54), (-80.772, -2.54))
            add(Edge.make_bspline(
                [(-80.772, -2.54), (-80.6815177202, -1.0831034742), (-82.1486189961, -2.0507695153), (-83.312, 6.096)],
                knots=[0, 0, 0, 0, 9.0017829345, 9.0017829345, 9.0017829345, 9.0017829345], degree=3))
            Line((-83.312, 6.096), (-83.312, -2.54))
        make_face()
    extrude(amount=-F13_DEPTH)

    # F14 (on face) → F15 (join, through all)
    with BuildSketch(Plane.XY.offset(22.6178866096)):
        with BuildLine():
            add(Edge.make_bspline(
                [(-80.7734341134, 2.4546581032), (-80.8589532971, 1.342135598), (-82.2274386883, 1.9601618405), (-83.312, -4.8822709359)],
                knots=[0, 0, 0, 0, 7.7636875572, 7.7636875572, 7.7636875572, 7.7636875572], degree=3))
            Line((-80.7734341134, 2.4546581032), (-83.312, 2.54))
            Line((-83.312, 2.54), (-83.312, -4.7201365232))
            Line((-83.312, -4.7201365232), (-83.312, -4.8822709359))
        make_face()
    extrude(amount=-F15_DEPTH)

    # F16
    f16_edges = [f4.edges().sort_by_distance(p)[0] for p in [
        (-21.368773, 2.54, -47.550396),
        (-89.001976, 2.54, -16.51),
        (-89.001976, 2.54, 16.267887),
        (87.54348, 2.54, -0.162636),
        (57.916909, 2.54, 44.47829),
    ]]
    fillet(f16_edges, radius=F16_R)


with BuildPart() as f18:
    # F17 (on face) → F18 (new body)
    with BuildSketch(Plane.XZ.offset(14.732)):
        with BuildLine():
            ThreePointArc((28.2864236116, 10.7885061807), (24.5314617002, 8.0209659875), (20.6062090392, 5.5007657527))
            ThreePointArc((20.6062090392, 5.5007657527), (21.0578525442, 2.7668475206), (21.209, 0))
            ThreePointArc((21.209, 0), (19.9758983224, -7.8179936988), (16.3963208288, -14.876902268))
            ThreePointArc((16.3963208288, -14.876902268), (25.5905, -10.1773472949), (34.7846791712, -14.876902268))
            ThreePointArc((34.7846791712, -14.876902268), (29.972808178, 0.2026198097), (35.0246425652, 15.2034550488))
            ThreePointArc((35.0246425652, 15.2034550488), (32.0447675603, 12.4019200322), (28.2864236116, 10.7885061807))
        make_face()
        with BuildLine():
            ThreePointArc((16.1563574348, 15.2034550488), (18.8967351732, 10.5885071929), (20.6062090392, 5.5007657527))
            ThreePointArc((20.6062090392, 5.5007657527), (24.5314617002, 8.0209659875), (28.2864236116, 10.7885061807))
            ThreePointArc((28.2864236116, 10.7885061807), (21.5626169277, 11.1860010324), (16.1563574348, 15.2034550488))
        make_face()
    extrude(amount=F18_DEPTH)

    # F17 (on face) → F19 (join)
    with BuildSketch(Plane.XZ.offset(14.732)):
        with BuildLine():
            ThreePointArc((74.2693311981, 16.9720615598), (54.2284807525, 25.3742460722), (35.0246425652, 15.2034550488))
            ThreePointArc((35.0246425652, 15.2034550488), (29.972808178, 0.2026198097), (34.7846791712, -14.876902268))
            ThreePointArc((34.7846791712, -14.876902268), (38.5125210941, -18.99784122), (43.0472991139, -22.2094967991))
            ThreePointArc((43.0472991139, -22.2094967991), (63.0016110107, -24.2270310981), (78.1990053344, -11.1394715972))
            ThreePointArc((78.1990053344, -11.1394715972), (80.1203932357, -5.7163827945), (80.772, 0))
            ThreePointArc((80.772, 0), (80.209280043, 5.3169088827), (78.5460535381, 10.3982326679))
            ThreePointArc((78.5460535381, 10.3982326679), (76.662940796, 13.8512035585), (74.2693311981, 16.9720615598))
        make_face()
        with Locations((55.372, 0)):
            Circle(F17_R, mode=Mode.SUBTRACT)
        with Locations((55.372, 0)):
            Circle(F17_R)
        with Locations((55.372, 0)):
            Circle(F17_R_2, mode=Mode.SUBTRACT)
        with BuildLine():
            ThreePointArc((-22.0352595619, -4.5491346088), (-7.5002575265, 18.1152156935), (14.1091283255, 2.0536621604))
            ThreePointArc((14.1091283255, 2.0536621604), (17.4014337238, 3.6947258621), (20.6062090392, 5.5007657527))
            ThreePointArc((20.6062090392, 5.5007657527), (18.8967351732, 10.5885071929), (16.1563574348, 15.2034550488))
            ThreePointArc((16.1563574348, 15.2034550488), (-13.9039135762, 23.4695400437), (-29.3314617697, -3.6217650399))
            ThreePointArc((-29.3314617697, -3.6217650399), (-25.6951347151, -4.1780837077), (-22.0352595619, -4.5491346088))
        make_face()
        with BuildLine():
            ThreePointArc((14.1091283255, 2.0536621604), (14.1952596538, 1.0284361636), (14.224, 0))
            ThreePointArc((14.224, 0), (-1.8986011289, -18.2717577812), (-22.0352595619, -4.5491346088))
            ThreePointArc((-22.0352595619, -4.5491346088), (-25.6951347151, -4.1780837077), (-29.3314617697, -3.6217650399))
            ThreePointArc((-29.3314617697, -3.6217650399), (-21.7360818632, -18.3665484622), (-6.6594189467, -25.2797727028))
            ThreePointArc((-6.6594189467, -25.2797727028), (-4.678865898, -23.6100705511), (-2.4996713636, -22.2094967991))
            ThreePointArc((-2.4996713636, -22.2094967991), (5.9863881024, -18.5416288768), (15.0267873519, -16.6083307198))
            ThreePointArc((15.0267873519, -16.6083307198), (15.7303734577, -15.7575023262), (16.3963208288, -14.876902268))
            ThreePointArc((16.3963208288, -14.876902268), (19.9758983224, -7.8179936988), (21.209, 0))
            ThreePointArc((21.209, 0), (21.0578525442, 2.7668475206), (20.6062090392, 5.5007657527))
            ThreePointArc((20.6062090392, 5.5007657527), (17.4014337238, 3.6947258621), (14.1091283255, 2.0536621604))
        make_face()
        with BuildLine():
            ThreePointArc((-2.4996713636, -22.2094967991), (-4.678865898, -23.6100705511), (-6.6594189467, -25.2797727028))
            ThreePointArc((-6.6594189467, -25.2797727028), (5.2394725231, -23.5844480112), (15.0267873519, -16.6083307198))
            ThreePointArc((15.0267873519, -16.6083307198), (5.9863881024, -18.5416288768), (-2.4996713636, -22.2094967991))
        make_face()
    extrude(amount=F19_DEPTH)

    # F20
    f20_edges = [f18.edges().sort_by_distance(p)[0] for p in [
        (32.197946, -27.432, -10.398233),
        (-1.722581, -27.432, 25.279773),
    ]]
    fillet(f20_edges, radius=F20_R)


solid = Compound([f1.part, f4.part, f18.part])
